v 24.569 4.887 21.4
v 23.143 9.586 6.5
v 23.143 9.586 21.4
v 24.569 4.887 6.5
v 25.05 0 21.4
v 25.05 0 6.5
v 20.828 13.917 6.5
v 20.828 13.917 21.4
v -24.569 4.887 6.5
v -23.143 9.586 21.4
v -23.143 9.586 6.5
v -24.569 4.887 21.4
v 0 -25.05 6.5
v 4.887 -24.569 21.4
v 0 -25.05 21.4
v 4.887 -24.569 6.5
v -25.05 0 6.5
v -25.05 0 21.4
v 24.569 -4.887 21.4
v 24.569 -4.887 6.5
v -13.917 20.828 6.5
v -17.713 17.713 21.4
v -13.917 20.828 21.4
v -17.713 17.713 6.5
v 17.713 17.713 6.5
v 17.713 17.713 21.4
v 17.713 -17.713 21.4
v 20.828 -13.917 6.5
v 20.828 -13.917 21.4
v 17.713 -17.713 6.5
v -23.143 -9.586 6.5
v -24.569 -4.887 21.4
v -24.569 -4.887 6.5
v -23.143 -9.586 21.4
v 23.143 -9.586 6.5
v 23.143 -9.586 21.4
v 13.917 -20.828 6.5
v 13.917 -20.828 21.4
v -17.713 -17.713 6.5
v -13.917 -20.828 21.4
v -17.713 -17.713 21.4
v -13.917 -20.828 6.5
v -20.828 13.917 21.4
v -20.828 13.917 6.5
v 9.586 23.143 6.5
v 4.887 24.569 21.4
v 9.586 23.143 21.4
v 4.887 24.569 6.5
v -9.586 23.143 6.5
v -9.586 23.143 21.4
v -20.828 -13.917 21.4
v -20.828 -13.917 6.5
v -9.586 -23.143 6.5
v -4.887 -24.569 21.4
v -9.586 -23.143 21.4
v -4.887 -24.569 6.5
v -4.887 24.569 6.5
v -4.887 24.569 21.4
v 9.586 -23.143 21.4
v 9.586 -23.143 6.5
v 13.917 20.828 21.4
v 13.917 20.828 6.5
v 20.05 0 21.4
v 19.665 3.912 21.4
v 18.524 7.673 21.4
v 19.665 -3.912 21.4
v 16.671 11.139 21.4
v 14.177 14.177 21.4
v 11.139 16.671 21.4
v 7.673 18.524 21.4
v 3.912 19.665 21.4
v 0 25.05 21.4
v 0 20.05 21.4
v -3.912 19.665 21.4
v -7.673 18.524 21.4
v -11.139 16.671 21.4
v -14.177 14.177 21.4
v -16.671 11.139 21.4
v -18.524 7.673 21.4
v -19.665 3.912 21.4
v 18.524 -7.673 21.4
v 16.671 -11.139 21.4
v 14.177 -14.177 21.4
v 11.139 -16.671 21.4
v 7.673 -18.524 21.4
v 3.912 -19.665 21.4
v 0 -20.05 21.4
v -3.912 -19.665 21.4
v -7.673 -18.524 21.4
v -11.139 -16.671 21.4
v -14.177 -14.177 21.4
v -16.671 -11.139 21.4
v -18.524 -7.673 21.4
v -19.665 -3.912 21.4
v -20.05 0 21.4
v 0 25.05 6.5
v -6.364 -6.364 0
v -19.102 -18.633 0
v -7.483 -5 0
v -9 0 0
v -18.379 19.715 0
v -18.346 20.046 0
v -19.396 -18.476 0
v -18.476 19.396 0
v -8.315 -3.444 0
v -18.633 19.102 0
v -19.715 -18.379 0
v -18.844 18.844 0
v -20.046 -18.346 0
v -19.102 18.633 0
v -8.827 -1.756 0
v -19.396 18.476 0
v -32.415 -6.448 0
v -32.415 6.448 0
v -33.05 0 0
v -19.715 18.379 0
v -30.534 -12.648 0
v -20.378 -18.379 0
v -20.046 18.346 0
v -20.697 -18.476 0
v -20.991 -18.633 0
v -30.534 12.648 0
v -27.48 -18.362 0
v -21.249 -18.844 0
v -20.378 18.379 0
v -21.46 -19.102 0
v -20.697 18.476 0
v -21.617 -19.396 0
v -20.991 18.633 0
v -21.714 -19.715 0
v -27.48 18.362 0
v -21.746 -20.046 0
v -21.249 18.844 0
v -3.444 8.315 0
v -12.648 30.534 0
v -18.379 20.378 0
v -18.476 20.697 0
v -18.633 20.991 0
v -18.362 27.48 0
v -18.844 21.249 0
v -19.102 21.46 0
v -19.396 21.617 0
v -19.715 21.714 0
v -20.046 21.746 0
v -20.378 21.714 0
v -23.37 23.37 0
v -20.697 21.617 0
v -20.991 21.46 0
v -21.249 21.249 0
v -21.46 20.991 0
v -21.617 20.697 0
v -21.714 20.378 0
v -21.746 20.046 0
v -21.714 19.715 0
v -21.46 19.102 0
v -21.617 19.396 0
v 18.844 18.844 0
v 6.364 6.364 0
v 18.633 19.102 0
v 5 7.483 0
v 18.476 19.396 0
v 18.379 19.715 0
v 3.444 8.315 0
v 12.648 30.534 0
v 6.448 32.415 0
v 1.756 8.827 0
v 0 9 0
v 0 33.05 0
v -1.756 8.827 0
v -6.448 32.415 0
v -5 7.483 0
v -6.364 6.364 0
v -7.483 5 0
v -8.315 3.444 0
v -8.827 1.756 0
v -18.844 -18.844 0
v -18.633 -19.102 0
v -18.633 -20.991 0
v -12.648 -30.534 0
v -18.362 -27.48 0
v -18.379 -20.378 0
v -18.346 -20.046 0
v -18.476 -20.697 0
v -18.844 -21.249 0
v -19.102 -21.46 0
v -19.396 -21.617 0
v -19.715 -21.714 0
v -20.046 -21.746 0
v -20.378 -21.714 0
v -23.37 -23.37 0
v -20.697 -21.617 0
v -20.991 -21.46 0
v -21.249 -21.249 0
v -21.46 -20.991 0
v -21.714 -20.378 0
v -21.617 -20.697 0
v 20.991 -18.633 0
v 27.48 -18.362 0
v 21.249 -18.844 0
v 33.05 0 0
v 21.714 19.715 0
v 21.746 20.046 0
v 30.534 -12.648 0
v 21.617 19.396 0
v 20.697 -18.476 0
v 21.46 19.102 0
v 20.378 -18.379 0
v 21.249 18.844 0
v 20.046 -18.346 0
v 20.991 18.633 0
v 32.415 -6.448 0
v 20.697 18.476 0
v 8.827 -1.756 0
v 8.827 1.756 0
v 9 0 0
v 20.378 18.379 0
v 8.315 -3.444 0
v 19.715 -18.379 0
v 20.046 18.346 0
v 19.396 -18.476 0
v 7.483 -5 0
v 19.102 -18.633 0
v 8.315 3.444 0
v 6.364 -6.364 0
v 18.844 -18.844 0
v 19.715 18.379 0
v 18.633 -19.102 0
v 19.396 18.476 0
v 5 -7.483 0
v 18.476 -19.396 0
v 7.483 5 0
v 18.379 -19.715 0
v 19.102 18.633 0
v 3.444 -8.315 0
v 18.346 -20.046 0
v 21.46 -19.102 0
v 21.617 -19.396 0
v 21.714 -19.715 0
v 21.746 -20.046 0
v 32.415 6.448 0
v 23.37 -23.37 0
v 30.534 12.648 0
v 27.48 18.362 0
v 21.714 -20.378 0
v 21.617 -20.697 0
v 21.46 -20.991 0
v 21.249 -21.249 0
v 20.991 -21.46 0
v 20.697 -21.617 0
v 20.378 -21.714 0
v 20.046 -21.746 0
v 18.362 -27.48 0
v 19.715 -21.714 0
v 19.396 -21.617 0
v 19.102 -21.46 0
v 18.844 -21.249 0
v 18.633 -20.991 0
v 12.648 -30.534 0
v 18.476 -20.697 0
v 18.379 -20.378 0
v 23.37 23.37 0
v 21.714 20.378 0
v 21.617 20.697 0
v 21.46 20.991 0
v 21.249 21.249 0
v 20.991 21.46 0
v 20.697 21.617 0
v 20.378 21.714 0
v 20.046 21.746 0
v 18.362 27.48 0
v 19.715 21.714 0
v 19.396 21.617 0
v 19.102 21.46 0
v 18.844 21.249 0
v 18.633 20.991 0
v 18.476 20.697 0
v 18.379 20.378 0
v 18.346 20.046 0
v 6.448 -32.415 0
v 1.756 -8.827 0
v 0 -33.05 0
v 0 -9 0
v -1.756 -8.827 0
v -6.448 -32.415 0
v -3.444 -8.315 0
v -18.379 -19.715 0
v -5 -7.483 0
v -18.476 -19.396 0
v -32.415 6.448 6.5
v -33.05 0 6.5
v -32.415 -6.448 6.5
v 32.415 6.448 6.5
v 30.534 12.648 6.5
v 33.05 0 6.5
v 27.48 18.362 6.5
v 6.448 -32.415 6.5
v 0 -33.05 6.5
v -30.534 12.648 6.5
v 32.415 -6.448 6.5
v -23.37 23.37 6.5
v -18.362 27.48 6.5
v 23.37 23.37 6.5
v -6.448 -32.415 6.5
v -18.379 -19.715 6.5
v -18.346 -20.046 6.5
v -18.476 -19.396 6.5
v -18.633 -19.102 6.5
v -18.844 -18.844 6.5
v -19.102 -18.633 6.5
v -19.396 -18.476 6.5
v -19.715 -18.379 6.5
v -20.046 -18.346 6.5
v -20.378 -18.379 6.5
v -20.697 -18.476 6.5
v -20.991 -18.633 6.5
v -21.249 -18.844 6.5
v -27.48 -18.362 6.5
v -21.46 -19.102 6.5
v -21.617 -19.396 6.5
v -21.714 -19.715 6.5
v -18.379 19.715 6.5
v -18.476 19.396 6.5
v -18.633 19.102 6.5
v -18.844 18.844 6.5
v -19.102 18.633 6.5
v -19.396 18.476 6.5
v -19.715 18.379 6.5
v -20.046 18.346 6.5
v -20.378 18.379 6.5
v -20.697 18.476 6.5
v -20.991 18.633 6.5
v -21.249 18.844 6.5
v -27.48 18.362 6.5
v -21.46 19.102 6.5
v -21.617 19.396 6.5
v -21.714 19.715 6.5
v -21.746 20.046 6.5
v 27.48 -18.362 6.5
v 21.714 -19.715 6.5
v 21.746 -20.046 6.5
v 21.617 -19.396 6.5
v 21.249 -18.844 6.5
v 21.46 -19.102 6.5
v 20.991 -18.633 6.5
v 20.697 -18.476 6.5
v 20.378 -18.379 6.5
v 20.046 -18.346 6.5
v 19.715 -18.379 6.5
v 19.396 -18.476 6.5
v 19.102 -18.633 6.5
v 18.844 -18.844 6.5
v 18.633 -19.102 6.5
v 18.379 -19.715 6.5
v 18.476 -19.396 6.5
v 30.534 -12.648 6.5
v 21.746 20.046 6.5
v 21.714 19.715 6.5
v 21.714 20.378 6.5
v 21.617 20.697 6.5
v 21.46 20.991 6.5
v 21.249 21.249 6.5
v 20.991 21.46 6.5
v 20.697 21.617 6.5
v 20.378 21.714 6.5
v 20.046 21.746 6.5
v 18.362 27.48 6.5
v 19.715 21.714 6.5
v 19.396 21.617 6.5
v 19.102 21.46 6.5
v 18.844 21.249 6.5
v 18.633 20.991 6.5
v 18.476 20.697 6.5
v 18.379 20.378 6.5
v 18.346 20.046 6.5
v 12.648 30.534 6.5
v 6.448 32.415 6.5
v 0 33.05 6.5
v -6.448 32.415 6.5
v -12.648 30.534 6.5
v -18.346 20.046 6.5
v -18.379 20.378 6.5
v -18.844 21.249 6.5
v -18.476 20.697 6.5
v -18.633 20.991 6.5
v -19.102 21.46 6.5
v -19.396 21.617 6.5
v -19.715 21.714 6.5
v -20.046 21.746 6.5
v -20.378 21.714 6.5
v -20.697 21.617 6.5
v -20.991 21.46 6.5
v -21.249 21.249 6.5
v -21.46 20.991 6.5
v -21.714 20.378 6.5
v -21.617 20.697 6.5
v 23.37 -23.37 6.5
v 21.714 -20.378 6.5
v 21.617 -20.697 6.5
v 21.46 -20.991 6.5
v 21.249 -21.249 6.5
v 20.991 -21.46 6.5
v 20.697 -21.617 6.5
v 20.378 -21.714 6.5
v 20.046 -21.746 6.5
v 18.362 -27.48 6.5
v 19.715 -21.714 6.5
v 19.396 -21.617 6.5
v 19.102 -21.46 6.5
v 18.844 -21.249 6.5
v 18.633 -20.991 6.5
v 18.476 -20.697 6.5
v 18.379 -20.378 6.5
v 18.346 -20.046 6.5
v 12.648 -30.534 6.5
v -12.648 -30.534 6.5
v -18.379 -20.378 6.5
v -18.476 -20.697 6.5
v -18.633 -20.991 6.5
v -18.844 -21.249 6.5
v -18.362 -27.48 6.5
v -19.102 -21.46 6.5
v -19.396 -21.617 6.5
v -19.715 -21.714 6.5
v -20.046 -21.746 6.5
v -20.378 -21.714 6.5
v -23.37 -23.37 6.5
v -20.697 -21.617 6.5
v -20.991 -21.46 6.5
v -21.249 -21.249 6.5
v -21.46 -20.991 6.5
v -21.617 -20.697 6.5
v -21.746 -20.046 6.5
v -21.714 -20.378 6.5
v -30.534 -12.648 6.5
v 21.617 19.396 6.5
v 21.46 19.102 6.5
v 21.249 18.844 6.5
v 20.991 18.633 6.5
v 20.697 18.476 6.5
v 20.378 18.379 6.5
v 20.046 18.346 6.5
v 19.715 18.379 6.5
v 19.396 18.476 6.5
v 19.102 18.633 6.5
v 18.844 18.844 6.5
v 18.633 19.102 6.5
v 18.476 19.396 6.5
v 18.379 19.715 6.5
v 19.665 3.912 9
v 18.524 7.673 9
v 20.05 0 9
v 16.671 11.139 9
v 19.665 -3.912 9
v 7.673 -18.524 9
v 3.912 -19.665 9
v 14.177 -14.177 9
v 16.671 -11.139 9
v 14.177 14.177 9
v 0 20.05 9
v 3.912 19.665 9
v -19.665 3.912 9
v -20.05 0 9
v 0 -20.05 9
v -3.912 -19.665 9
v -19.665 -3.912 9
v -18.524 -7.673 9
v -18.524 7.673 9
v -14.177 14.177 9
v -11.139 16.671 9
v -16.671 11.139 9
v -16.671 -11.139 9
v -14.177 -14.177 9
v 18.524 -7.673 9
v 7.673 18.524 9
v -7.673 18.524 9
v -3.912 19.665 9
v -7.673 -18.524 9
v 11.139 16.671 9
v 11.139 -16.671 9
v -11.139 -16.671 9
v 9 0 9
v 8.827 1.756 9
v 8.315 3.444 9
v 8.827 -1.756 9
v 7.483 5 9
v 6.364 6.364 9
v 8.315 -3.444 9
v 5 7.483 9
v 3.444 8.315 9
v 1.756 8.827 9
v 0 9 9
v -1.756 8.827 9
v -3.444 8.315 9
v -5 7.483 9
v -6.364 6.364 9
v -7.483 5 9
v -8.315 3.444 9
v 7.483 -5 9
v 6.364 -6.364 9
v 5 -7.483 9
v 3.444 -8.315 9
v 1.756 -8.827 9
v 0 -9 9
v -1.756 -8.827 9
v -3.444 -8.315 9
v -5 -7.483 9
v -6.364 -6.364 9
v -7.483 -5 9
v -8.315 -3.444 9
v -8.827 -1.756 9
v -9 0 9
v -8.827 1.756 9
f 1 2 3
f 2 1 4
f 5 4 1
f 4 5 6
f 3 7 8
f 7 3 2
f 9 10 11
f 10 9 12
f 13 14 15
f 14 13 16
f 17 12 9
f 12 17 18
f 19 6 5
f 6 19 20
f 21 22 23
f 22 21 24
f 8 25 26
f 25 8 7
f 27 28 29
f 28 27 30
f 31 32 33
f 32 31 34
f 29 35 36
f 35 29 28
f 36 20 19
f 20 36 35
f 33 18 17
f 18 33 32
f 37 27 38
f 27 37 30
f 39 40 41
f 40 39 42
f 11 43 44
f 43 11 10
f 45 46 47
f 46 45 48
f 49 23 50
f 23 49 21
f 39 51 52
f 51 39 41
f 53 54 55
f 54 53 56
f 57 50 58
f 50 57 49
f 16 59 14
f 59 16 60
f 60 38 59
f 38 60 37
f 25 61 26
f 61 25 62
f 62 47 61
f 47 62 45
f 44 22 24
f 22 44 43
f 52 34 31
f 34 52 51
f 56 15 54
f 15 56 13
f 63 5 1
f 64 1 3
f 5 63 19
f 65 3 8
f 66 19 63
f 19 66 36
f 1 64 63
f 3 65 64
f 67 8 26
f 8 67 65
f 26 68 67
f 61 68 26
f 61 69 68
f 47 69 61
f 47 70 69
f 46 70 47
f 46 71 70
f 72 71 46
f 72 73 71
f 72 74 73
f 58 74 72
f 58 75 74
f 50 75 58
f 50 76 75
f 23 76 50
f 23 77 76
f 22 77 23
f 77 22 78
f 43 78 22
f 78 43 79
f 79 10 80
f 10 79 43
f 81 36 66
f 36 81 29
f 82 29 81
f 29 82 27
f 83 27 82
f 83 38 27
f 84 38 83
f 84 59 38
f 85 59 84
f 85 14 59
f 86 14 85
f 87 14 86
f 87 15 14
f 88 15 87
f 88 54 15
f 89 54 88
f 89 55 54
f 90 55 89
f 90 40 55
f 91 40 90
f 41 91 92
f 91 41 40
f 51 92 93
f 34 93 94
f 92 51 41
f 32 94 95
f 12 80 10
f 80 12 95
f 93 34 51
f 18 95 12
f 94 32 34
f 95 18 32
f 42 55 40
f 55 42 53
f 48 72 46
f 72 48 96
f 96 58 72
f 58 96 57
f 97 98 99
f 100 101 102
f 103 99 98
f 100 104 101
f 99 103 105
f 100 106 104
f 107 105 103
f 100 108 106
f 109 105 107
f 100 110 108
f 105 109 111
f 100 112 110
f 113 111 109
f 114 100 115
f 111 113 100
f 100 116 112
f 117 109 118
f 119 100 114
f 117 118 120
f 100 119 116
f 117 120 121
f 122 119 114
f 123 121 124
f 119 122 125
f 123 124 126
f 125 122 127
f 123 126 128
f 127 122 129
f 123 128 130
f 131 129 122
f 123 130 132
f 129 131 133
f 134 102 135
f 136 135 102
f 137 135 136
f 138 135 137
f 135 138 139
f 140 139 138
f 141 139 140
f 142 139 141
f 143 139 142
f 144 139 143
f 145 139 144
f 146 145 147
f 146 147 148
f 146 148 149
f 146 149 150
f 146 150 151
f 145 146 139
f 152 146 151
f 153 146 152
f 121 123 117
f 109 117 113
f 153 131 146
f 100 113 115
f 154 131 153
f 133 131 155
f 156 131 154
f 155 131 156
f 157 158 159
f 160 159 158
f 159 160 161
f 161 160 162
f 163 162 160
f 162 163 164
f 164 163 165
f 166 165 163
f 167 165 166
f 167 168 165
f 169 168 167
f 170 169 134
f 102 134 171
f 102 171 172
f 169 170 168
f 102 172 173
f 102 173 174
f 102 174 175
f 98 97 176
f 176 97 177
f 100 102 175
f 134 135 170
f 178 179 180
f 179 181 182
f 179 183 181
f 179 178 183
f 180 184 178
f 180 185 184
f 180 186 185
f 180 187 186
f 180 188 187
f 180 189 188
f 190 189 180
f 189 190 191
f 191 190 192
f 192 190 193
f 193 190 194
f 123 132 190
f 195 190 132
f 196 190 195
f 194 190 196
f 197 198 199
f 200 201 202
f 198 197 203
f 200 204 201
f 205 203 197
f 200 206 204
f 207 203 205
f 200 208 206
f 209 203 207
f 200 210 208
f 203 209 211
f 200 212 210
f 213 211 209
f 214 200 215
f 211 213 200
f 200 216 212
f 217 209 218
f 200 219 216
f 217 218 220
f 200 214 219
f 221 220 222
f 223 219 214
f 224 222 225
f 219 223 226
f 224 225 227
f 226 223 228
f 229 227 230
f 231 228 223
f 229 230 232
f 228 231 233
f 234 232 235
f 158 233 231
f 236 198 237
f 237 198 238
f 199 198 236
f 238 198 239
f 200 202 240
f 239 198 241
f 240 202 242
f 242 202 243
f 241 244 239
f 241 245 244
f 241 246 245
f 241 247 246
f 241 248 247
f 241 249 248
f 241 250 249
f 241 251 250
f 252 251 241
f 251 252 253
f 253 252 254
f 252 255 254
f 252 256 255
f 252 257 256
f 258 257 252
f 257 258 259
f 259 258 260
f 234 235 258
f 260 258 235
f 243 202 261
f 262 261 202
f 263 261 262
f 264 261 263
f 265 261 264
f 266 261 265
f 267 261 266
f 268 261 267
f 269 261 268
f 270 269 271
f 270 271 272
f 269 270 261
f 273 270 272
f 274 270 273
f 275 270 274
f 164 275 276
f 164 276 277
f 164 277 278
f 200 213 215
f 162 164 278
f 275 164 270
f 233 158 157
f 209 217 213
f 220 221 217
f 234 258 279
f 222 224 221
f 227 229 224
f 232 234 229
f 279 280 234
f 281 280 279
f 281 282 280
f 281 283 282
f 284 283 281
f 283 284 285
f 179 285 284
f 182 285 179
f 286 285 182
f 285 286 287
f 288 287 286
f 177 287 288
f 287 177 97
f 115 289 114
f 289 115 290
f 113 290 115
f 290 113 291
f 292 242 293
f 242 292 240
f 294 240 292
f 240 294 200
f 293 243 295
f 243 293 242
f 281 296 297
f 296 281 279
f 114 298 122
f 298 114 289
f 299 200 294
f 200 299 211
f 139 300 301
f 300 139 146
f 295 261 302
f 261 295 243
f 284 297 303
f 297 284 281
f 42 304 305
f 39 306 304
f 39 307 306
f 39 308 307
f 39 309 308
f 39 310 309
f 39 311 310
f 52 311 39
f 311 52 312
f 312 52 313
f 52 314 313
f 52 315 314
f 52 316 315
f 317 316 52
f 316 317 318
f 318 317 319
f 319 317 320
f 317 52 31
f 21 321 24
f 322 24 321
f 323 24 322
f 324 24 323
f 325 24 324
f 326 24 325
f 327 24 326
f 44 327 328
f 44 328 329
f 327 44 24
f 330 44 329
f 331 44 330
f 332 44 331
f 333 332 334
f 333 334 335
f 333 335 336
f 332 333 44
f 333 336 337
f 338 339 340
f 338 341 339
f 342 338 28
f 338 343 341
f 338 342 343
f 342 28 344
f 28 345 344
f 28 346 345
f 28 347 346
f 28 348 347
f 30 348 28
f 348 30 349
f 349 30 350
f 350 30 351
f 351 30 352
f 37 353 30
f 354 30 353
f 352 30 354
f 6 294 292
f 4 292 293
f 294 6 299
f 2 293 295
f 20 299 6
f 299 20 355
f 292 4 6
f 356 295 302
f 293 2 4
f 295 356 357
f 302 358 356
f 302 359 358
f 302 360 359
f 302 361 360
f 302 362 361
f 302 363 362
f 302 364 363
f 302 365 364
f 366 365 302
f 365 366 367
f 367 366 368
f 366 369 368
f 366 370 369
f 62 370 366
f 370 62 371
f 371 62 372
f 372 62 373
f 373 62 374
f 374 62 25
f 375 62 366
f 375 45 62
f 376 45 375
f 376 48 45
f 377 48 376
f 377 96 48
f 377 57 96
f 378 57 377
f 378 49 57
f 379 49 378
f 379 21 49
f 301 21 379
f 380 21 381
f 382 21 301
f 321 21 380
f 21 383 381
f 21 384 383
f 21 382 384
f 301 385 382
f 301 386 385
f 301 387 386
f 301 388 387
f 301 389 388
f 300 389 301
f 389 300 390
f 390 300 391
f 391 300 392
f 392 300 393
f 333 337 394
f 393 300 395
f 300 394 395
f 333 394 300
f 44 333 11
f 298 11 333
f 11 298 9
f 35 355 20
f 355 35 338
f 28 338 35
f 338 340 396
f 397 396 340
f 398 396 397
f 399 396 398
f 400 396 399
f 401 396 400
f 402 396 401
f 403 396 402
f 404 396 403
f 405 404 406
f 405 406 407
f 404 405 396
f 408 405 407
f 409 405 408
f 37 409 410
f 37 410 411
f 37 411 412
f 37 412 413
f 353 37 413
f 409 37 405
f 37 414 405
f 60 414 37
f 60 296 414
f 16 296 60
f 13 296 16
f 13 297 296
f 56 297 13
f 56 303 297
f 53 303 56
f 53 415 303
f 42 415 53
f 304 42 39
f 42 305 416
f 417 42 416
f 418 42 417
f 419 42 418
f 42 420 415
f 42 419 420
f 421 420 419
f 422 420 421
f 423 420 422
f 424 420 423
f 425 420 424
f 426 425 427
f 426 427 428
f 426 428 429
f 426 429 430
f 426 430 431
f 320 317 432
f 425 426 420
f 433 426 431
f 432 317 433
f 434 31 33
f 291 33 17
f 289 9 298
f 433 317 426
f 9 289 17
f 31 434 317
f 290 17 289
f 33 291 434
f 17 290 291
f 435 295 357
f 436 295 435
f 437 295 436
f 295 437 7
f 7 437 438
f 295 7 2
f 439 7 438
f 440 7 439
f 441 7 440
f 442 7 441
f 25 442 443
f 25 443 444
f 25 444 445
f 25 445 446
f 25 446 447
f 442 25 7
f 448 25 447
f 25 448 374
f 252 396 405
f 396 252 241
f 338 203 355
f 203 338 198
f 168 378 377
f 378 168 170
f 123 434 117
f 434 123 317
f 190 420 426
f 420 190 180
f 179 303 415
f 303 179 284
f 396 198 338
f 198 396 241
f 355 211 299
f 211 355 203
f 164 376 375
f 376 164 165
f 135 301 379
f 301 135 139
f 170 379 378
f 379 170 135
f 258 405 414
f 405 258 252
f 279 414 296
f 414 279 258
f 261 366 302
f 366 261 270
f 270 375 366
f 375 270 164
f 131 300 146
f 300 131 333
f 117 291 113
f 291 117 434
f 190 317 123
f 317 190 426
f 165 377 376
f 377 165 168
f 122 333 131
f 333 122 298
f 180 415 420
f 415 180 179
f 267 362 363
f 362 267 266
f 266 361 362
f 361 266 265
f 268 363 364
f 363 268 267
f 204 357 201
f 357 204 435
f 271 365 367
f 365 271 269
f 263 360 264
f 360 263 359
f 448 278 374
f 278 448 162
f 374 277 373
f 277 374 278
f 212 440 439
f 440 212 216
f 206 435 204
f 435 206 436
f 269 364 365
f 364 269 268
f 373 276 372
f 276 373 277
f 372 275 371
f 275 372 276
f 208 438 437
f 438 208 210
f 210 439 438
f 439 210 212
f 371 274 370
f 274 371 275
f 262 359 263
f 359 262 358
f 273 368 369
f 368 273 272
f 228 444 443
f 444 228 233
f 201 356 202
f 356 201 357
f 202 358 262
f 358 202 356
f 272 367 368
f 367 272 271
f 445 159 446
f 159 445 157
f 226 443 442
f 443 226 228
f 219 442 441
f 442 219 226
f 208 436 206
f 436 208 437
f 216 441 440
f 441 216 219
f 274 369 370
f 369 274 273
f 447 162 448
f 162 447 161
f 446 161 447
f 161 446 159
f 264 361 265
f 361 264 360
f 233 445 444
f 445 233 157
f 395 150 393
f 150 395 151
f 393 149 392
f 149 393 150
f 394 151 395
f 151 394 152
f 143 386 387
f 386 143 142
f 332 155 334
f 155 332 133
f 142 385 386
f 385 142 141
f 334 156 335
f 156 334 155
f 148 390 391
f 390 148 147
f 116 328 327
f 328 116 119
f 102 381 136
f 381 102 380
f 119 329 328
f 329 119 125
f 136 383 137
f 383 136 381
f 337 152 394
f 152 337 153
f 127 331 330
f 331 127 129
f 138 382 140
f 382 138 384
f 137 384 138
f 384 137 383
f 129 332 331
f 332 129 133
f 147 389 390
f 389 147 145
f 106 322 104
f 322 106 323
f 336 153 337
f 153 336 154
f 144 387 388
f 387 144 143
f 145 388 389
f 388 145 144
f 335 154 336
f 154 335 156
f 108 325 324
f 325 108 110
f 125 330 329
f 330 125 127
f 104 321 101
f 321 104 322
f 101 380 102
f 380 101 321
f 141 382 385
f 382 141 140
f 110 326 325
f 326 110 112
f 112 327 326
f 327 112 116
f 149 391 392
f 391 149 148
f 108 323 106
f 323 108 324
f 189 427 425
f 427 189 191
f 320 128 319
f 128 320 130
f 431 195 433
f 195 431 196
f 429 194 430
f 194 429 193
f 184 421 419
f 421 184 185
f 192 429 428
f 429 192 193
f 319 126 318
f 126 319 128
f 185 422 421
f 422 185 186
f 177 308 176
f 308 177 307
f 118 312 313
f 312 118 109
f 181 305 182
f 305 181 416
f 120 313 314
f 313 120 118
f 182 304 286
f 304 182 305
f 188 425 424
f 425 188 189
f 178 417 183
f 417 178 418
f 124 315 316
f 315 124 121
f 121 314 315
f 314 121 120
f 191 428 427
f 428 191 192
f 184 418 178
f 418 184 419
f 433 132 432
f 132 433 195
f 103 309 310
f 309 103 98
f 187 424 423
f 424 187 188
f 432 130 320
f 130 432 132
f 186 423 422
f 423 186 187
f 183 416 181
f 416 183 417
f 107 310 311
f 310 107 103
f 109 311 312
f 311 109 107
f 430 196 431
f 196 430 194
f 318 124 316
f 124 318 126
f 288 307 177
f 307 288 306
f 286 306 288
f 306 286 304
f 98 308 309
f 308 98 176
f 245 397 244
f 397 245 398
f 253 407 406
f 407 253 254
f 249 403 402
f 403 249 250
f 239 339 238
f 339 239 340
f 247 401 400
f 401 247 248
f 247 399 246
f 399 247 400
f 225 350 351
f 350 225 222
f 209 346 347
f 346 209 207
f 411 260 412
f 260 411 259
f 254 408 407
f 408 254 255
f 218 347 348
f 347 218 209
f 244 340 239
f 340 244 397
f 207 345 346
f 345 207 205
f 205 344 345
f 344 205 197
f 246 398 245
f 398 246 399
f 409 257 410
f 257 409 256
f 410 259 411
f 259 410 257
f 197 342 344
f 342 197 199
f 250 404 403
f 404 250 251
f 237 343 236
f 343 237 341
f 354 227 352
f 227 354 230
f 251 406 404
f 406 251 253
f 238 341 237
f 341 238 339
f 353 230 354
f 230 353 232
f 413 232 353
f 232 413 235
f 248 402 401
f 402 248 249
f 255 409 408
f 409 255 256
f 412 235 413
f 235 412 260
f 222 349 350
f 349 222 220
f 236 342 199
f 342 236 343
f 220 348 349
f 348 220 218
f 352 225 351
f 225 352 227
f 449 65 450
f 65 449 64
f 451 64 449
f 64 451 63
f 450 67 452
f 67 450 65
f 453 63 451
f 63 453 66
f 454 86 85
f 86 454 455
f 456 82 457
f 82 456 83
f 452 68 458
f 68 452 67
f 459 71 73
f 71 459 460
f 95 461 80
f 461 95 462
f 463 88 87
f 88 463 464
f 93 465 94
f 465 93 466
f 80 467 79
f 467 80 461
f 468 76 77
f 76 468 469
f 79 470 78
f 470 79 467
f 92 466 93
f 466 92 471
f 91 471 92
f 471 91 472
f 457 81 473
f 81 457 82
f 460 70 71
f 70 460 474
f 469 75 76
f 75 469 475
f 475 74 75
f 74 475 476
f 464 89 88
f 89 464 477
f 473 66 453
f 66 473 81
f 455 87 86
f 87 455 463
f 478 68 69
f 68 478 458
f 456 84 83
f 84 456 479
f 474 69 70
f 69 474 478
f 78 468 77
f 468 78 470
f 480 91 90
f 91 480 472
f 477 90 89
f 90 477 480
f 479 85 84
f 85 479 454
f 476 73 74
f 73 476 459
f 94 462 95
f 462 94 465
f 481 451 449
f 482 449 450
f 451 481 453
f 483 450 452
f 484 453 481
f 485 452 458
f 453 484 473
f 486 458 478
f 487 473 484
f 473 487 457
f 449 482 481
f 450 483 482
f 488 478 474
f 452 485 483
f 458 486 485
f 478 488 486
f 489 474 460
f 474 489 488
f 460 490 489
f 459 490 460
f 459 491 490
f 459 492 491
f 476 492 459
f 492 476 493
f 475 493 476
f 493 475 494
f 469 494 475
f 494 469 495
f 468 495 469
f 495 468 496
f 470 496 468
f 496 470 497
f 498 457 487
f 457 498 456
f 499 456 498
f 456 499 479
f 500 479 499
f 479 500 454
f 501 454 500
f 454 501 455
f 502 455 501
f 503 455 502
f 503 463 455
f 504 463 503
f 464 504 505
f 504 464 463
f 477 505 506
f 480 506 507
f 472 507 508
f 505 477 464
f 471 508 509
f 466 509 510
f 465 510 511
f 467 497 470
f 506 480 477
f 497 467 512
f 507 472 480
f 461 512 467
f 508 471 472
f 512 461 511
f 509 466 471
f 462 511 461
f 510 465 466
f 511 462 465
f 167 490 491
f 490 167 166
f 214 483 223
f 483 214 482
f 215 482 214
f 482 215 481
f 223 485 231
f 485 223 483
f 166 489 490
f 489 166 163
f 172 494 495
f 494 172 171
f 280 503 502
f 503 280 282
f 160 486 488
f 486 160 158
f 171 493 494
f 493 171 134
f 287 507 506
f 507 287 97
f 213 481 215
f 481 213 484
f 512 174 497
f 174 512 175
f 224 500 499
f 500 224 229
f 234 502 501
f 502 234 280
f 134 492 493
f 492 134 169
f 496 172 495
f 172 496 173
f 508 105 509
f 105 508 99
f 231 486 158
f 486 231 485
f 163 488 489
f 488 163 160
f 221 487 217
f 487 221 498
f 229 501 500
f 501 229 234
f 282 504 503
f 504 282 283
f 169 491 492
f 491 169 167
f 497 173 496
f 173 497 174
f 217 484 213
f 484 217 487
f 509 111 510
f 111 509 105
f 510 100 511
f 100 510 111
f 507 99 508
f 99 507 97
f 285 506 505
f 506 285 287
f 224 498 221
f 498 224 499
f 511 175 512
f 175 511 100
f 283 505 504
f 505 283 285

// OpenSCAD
$fn = 32;

// ----------------------------------------------------------------------
// Bearing housing: seat for 6203 (40 x 12 mm), 50.1 mm body
// ----------------------------------------------------------------------

// --- parameters (mm) ---
housing_d = 50.1;         // housing outside diameter
housing_h = 21.4;         // overall housing height
wall_t = 5;               // wall thickness
seat_d = 40.1;            // 6203 seat, 0.1 mm clearance
seat_h = 12.4;            // pocket depth
shoulder = 4;             // shoulder under the bearing
pass_d = 18;              // shaft passage
flange_d = 66.1;          // mounting flange diameter
flange_t = 5;             // flange thickness
bolt_d = 3.4;             // flange bolt clearance
bolt_r = 28.35;           // flange bolt circle radius

module body() {
  cylinder(h = housing_h, d = housing_d);
}

module flange() {
  /* flange sunk 1.5 mm into the body */
  cylinder(h = flange_t + 1.5, d = flange_d);
}

difference() {
  union() {
    body();
    flange();
  }
  translate([0, 0, housing_h - seat_h]) cylinder(h = seat_h + 1, d = seat_d);
  translate([0, 0, -1]) cylinder(h = housing_h - seat_h + 1, d = pass_d);
  for (i = [0 : 3]) rotate([0, 0, 45 + i * 90]) translate([bolt_r, 0, -1])
    cylinder(h = flange_t + 3, d = bolt_d);
}
